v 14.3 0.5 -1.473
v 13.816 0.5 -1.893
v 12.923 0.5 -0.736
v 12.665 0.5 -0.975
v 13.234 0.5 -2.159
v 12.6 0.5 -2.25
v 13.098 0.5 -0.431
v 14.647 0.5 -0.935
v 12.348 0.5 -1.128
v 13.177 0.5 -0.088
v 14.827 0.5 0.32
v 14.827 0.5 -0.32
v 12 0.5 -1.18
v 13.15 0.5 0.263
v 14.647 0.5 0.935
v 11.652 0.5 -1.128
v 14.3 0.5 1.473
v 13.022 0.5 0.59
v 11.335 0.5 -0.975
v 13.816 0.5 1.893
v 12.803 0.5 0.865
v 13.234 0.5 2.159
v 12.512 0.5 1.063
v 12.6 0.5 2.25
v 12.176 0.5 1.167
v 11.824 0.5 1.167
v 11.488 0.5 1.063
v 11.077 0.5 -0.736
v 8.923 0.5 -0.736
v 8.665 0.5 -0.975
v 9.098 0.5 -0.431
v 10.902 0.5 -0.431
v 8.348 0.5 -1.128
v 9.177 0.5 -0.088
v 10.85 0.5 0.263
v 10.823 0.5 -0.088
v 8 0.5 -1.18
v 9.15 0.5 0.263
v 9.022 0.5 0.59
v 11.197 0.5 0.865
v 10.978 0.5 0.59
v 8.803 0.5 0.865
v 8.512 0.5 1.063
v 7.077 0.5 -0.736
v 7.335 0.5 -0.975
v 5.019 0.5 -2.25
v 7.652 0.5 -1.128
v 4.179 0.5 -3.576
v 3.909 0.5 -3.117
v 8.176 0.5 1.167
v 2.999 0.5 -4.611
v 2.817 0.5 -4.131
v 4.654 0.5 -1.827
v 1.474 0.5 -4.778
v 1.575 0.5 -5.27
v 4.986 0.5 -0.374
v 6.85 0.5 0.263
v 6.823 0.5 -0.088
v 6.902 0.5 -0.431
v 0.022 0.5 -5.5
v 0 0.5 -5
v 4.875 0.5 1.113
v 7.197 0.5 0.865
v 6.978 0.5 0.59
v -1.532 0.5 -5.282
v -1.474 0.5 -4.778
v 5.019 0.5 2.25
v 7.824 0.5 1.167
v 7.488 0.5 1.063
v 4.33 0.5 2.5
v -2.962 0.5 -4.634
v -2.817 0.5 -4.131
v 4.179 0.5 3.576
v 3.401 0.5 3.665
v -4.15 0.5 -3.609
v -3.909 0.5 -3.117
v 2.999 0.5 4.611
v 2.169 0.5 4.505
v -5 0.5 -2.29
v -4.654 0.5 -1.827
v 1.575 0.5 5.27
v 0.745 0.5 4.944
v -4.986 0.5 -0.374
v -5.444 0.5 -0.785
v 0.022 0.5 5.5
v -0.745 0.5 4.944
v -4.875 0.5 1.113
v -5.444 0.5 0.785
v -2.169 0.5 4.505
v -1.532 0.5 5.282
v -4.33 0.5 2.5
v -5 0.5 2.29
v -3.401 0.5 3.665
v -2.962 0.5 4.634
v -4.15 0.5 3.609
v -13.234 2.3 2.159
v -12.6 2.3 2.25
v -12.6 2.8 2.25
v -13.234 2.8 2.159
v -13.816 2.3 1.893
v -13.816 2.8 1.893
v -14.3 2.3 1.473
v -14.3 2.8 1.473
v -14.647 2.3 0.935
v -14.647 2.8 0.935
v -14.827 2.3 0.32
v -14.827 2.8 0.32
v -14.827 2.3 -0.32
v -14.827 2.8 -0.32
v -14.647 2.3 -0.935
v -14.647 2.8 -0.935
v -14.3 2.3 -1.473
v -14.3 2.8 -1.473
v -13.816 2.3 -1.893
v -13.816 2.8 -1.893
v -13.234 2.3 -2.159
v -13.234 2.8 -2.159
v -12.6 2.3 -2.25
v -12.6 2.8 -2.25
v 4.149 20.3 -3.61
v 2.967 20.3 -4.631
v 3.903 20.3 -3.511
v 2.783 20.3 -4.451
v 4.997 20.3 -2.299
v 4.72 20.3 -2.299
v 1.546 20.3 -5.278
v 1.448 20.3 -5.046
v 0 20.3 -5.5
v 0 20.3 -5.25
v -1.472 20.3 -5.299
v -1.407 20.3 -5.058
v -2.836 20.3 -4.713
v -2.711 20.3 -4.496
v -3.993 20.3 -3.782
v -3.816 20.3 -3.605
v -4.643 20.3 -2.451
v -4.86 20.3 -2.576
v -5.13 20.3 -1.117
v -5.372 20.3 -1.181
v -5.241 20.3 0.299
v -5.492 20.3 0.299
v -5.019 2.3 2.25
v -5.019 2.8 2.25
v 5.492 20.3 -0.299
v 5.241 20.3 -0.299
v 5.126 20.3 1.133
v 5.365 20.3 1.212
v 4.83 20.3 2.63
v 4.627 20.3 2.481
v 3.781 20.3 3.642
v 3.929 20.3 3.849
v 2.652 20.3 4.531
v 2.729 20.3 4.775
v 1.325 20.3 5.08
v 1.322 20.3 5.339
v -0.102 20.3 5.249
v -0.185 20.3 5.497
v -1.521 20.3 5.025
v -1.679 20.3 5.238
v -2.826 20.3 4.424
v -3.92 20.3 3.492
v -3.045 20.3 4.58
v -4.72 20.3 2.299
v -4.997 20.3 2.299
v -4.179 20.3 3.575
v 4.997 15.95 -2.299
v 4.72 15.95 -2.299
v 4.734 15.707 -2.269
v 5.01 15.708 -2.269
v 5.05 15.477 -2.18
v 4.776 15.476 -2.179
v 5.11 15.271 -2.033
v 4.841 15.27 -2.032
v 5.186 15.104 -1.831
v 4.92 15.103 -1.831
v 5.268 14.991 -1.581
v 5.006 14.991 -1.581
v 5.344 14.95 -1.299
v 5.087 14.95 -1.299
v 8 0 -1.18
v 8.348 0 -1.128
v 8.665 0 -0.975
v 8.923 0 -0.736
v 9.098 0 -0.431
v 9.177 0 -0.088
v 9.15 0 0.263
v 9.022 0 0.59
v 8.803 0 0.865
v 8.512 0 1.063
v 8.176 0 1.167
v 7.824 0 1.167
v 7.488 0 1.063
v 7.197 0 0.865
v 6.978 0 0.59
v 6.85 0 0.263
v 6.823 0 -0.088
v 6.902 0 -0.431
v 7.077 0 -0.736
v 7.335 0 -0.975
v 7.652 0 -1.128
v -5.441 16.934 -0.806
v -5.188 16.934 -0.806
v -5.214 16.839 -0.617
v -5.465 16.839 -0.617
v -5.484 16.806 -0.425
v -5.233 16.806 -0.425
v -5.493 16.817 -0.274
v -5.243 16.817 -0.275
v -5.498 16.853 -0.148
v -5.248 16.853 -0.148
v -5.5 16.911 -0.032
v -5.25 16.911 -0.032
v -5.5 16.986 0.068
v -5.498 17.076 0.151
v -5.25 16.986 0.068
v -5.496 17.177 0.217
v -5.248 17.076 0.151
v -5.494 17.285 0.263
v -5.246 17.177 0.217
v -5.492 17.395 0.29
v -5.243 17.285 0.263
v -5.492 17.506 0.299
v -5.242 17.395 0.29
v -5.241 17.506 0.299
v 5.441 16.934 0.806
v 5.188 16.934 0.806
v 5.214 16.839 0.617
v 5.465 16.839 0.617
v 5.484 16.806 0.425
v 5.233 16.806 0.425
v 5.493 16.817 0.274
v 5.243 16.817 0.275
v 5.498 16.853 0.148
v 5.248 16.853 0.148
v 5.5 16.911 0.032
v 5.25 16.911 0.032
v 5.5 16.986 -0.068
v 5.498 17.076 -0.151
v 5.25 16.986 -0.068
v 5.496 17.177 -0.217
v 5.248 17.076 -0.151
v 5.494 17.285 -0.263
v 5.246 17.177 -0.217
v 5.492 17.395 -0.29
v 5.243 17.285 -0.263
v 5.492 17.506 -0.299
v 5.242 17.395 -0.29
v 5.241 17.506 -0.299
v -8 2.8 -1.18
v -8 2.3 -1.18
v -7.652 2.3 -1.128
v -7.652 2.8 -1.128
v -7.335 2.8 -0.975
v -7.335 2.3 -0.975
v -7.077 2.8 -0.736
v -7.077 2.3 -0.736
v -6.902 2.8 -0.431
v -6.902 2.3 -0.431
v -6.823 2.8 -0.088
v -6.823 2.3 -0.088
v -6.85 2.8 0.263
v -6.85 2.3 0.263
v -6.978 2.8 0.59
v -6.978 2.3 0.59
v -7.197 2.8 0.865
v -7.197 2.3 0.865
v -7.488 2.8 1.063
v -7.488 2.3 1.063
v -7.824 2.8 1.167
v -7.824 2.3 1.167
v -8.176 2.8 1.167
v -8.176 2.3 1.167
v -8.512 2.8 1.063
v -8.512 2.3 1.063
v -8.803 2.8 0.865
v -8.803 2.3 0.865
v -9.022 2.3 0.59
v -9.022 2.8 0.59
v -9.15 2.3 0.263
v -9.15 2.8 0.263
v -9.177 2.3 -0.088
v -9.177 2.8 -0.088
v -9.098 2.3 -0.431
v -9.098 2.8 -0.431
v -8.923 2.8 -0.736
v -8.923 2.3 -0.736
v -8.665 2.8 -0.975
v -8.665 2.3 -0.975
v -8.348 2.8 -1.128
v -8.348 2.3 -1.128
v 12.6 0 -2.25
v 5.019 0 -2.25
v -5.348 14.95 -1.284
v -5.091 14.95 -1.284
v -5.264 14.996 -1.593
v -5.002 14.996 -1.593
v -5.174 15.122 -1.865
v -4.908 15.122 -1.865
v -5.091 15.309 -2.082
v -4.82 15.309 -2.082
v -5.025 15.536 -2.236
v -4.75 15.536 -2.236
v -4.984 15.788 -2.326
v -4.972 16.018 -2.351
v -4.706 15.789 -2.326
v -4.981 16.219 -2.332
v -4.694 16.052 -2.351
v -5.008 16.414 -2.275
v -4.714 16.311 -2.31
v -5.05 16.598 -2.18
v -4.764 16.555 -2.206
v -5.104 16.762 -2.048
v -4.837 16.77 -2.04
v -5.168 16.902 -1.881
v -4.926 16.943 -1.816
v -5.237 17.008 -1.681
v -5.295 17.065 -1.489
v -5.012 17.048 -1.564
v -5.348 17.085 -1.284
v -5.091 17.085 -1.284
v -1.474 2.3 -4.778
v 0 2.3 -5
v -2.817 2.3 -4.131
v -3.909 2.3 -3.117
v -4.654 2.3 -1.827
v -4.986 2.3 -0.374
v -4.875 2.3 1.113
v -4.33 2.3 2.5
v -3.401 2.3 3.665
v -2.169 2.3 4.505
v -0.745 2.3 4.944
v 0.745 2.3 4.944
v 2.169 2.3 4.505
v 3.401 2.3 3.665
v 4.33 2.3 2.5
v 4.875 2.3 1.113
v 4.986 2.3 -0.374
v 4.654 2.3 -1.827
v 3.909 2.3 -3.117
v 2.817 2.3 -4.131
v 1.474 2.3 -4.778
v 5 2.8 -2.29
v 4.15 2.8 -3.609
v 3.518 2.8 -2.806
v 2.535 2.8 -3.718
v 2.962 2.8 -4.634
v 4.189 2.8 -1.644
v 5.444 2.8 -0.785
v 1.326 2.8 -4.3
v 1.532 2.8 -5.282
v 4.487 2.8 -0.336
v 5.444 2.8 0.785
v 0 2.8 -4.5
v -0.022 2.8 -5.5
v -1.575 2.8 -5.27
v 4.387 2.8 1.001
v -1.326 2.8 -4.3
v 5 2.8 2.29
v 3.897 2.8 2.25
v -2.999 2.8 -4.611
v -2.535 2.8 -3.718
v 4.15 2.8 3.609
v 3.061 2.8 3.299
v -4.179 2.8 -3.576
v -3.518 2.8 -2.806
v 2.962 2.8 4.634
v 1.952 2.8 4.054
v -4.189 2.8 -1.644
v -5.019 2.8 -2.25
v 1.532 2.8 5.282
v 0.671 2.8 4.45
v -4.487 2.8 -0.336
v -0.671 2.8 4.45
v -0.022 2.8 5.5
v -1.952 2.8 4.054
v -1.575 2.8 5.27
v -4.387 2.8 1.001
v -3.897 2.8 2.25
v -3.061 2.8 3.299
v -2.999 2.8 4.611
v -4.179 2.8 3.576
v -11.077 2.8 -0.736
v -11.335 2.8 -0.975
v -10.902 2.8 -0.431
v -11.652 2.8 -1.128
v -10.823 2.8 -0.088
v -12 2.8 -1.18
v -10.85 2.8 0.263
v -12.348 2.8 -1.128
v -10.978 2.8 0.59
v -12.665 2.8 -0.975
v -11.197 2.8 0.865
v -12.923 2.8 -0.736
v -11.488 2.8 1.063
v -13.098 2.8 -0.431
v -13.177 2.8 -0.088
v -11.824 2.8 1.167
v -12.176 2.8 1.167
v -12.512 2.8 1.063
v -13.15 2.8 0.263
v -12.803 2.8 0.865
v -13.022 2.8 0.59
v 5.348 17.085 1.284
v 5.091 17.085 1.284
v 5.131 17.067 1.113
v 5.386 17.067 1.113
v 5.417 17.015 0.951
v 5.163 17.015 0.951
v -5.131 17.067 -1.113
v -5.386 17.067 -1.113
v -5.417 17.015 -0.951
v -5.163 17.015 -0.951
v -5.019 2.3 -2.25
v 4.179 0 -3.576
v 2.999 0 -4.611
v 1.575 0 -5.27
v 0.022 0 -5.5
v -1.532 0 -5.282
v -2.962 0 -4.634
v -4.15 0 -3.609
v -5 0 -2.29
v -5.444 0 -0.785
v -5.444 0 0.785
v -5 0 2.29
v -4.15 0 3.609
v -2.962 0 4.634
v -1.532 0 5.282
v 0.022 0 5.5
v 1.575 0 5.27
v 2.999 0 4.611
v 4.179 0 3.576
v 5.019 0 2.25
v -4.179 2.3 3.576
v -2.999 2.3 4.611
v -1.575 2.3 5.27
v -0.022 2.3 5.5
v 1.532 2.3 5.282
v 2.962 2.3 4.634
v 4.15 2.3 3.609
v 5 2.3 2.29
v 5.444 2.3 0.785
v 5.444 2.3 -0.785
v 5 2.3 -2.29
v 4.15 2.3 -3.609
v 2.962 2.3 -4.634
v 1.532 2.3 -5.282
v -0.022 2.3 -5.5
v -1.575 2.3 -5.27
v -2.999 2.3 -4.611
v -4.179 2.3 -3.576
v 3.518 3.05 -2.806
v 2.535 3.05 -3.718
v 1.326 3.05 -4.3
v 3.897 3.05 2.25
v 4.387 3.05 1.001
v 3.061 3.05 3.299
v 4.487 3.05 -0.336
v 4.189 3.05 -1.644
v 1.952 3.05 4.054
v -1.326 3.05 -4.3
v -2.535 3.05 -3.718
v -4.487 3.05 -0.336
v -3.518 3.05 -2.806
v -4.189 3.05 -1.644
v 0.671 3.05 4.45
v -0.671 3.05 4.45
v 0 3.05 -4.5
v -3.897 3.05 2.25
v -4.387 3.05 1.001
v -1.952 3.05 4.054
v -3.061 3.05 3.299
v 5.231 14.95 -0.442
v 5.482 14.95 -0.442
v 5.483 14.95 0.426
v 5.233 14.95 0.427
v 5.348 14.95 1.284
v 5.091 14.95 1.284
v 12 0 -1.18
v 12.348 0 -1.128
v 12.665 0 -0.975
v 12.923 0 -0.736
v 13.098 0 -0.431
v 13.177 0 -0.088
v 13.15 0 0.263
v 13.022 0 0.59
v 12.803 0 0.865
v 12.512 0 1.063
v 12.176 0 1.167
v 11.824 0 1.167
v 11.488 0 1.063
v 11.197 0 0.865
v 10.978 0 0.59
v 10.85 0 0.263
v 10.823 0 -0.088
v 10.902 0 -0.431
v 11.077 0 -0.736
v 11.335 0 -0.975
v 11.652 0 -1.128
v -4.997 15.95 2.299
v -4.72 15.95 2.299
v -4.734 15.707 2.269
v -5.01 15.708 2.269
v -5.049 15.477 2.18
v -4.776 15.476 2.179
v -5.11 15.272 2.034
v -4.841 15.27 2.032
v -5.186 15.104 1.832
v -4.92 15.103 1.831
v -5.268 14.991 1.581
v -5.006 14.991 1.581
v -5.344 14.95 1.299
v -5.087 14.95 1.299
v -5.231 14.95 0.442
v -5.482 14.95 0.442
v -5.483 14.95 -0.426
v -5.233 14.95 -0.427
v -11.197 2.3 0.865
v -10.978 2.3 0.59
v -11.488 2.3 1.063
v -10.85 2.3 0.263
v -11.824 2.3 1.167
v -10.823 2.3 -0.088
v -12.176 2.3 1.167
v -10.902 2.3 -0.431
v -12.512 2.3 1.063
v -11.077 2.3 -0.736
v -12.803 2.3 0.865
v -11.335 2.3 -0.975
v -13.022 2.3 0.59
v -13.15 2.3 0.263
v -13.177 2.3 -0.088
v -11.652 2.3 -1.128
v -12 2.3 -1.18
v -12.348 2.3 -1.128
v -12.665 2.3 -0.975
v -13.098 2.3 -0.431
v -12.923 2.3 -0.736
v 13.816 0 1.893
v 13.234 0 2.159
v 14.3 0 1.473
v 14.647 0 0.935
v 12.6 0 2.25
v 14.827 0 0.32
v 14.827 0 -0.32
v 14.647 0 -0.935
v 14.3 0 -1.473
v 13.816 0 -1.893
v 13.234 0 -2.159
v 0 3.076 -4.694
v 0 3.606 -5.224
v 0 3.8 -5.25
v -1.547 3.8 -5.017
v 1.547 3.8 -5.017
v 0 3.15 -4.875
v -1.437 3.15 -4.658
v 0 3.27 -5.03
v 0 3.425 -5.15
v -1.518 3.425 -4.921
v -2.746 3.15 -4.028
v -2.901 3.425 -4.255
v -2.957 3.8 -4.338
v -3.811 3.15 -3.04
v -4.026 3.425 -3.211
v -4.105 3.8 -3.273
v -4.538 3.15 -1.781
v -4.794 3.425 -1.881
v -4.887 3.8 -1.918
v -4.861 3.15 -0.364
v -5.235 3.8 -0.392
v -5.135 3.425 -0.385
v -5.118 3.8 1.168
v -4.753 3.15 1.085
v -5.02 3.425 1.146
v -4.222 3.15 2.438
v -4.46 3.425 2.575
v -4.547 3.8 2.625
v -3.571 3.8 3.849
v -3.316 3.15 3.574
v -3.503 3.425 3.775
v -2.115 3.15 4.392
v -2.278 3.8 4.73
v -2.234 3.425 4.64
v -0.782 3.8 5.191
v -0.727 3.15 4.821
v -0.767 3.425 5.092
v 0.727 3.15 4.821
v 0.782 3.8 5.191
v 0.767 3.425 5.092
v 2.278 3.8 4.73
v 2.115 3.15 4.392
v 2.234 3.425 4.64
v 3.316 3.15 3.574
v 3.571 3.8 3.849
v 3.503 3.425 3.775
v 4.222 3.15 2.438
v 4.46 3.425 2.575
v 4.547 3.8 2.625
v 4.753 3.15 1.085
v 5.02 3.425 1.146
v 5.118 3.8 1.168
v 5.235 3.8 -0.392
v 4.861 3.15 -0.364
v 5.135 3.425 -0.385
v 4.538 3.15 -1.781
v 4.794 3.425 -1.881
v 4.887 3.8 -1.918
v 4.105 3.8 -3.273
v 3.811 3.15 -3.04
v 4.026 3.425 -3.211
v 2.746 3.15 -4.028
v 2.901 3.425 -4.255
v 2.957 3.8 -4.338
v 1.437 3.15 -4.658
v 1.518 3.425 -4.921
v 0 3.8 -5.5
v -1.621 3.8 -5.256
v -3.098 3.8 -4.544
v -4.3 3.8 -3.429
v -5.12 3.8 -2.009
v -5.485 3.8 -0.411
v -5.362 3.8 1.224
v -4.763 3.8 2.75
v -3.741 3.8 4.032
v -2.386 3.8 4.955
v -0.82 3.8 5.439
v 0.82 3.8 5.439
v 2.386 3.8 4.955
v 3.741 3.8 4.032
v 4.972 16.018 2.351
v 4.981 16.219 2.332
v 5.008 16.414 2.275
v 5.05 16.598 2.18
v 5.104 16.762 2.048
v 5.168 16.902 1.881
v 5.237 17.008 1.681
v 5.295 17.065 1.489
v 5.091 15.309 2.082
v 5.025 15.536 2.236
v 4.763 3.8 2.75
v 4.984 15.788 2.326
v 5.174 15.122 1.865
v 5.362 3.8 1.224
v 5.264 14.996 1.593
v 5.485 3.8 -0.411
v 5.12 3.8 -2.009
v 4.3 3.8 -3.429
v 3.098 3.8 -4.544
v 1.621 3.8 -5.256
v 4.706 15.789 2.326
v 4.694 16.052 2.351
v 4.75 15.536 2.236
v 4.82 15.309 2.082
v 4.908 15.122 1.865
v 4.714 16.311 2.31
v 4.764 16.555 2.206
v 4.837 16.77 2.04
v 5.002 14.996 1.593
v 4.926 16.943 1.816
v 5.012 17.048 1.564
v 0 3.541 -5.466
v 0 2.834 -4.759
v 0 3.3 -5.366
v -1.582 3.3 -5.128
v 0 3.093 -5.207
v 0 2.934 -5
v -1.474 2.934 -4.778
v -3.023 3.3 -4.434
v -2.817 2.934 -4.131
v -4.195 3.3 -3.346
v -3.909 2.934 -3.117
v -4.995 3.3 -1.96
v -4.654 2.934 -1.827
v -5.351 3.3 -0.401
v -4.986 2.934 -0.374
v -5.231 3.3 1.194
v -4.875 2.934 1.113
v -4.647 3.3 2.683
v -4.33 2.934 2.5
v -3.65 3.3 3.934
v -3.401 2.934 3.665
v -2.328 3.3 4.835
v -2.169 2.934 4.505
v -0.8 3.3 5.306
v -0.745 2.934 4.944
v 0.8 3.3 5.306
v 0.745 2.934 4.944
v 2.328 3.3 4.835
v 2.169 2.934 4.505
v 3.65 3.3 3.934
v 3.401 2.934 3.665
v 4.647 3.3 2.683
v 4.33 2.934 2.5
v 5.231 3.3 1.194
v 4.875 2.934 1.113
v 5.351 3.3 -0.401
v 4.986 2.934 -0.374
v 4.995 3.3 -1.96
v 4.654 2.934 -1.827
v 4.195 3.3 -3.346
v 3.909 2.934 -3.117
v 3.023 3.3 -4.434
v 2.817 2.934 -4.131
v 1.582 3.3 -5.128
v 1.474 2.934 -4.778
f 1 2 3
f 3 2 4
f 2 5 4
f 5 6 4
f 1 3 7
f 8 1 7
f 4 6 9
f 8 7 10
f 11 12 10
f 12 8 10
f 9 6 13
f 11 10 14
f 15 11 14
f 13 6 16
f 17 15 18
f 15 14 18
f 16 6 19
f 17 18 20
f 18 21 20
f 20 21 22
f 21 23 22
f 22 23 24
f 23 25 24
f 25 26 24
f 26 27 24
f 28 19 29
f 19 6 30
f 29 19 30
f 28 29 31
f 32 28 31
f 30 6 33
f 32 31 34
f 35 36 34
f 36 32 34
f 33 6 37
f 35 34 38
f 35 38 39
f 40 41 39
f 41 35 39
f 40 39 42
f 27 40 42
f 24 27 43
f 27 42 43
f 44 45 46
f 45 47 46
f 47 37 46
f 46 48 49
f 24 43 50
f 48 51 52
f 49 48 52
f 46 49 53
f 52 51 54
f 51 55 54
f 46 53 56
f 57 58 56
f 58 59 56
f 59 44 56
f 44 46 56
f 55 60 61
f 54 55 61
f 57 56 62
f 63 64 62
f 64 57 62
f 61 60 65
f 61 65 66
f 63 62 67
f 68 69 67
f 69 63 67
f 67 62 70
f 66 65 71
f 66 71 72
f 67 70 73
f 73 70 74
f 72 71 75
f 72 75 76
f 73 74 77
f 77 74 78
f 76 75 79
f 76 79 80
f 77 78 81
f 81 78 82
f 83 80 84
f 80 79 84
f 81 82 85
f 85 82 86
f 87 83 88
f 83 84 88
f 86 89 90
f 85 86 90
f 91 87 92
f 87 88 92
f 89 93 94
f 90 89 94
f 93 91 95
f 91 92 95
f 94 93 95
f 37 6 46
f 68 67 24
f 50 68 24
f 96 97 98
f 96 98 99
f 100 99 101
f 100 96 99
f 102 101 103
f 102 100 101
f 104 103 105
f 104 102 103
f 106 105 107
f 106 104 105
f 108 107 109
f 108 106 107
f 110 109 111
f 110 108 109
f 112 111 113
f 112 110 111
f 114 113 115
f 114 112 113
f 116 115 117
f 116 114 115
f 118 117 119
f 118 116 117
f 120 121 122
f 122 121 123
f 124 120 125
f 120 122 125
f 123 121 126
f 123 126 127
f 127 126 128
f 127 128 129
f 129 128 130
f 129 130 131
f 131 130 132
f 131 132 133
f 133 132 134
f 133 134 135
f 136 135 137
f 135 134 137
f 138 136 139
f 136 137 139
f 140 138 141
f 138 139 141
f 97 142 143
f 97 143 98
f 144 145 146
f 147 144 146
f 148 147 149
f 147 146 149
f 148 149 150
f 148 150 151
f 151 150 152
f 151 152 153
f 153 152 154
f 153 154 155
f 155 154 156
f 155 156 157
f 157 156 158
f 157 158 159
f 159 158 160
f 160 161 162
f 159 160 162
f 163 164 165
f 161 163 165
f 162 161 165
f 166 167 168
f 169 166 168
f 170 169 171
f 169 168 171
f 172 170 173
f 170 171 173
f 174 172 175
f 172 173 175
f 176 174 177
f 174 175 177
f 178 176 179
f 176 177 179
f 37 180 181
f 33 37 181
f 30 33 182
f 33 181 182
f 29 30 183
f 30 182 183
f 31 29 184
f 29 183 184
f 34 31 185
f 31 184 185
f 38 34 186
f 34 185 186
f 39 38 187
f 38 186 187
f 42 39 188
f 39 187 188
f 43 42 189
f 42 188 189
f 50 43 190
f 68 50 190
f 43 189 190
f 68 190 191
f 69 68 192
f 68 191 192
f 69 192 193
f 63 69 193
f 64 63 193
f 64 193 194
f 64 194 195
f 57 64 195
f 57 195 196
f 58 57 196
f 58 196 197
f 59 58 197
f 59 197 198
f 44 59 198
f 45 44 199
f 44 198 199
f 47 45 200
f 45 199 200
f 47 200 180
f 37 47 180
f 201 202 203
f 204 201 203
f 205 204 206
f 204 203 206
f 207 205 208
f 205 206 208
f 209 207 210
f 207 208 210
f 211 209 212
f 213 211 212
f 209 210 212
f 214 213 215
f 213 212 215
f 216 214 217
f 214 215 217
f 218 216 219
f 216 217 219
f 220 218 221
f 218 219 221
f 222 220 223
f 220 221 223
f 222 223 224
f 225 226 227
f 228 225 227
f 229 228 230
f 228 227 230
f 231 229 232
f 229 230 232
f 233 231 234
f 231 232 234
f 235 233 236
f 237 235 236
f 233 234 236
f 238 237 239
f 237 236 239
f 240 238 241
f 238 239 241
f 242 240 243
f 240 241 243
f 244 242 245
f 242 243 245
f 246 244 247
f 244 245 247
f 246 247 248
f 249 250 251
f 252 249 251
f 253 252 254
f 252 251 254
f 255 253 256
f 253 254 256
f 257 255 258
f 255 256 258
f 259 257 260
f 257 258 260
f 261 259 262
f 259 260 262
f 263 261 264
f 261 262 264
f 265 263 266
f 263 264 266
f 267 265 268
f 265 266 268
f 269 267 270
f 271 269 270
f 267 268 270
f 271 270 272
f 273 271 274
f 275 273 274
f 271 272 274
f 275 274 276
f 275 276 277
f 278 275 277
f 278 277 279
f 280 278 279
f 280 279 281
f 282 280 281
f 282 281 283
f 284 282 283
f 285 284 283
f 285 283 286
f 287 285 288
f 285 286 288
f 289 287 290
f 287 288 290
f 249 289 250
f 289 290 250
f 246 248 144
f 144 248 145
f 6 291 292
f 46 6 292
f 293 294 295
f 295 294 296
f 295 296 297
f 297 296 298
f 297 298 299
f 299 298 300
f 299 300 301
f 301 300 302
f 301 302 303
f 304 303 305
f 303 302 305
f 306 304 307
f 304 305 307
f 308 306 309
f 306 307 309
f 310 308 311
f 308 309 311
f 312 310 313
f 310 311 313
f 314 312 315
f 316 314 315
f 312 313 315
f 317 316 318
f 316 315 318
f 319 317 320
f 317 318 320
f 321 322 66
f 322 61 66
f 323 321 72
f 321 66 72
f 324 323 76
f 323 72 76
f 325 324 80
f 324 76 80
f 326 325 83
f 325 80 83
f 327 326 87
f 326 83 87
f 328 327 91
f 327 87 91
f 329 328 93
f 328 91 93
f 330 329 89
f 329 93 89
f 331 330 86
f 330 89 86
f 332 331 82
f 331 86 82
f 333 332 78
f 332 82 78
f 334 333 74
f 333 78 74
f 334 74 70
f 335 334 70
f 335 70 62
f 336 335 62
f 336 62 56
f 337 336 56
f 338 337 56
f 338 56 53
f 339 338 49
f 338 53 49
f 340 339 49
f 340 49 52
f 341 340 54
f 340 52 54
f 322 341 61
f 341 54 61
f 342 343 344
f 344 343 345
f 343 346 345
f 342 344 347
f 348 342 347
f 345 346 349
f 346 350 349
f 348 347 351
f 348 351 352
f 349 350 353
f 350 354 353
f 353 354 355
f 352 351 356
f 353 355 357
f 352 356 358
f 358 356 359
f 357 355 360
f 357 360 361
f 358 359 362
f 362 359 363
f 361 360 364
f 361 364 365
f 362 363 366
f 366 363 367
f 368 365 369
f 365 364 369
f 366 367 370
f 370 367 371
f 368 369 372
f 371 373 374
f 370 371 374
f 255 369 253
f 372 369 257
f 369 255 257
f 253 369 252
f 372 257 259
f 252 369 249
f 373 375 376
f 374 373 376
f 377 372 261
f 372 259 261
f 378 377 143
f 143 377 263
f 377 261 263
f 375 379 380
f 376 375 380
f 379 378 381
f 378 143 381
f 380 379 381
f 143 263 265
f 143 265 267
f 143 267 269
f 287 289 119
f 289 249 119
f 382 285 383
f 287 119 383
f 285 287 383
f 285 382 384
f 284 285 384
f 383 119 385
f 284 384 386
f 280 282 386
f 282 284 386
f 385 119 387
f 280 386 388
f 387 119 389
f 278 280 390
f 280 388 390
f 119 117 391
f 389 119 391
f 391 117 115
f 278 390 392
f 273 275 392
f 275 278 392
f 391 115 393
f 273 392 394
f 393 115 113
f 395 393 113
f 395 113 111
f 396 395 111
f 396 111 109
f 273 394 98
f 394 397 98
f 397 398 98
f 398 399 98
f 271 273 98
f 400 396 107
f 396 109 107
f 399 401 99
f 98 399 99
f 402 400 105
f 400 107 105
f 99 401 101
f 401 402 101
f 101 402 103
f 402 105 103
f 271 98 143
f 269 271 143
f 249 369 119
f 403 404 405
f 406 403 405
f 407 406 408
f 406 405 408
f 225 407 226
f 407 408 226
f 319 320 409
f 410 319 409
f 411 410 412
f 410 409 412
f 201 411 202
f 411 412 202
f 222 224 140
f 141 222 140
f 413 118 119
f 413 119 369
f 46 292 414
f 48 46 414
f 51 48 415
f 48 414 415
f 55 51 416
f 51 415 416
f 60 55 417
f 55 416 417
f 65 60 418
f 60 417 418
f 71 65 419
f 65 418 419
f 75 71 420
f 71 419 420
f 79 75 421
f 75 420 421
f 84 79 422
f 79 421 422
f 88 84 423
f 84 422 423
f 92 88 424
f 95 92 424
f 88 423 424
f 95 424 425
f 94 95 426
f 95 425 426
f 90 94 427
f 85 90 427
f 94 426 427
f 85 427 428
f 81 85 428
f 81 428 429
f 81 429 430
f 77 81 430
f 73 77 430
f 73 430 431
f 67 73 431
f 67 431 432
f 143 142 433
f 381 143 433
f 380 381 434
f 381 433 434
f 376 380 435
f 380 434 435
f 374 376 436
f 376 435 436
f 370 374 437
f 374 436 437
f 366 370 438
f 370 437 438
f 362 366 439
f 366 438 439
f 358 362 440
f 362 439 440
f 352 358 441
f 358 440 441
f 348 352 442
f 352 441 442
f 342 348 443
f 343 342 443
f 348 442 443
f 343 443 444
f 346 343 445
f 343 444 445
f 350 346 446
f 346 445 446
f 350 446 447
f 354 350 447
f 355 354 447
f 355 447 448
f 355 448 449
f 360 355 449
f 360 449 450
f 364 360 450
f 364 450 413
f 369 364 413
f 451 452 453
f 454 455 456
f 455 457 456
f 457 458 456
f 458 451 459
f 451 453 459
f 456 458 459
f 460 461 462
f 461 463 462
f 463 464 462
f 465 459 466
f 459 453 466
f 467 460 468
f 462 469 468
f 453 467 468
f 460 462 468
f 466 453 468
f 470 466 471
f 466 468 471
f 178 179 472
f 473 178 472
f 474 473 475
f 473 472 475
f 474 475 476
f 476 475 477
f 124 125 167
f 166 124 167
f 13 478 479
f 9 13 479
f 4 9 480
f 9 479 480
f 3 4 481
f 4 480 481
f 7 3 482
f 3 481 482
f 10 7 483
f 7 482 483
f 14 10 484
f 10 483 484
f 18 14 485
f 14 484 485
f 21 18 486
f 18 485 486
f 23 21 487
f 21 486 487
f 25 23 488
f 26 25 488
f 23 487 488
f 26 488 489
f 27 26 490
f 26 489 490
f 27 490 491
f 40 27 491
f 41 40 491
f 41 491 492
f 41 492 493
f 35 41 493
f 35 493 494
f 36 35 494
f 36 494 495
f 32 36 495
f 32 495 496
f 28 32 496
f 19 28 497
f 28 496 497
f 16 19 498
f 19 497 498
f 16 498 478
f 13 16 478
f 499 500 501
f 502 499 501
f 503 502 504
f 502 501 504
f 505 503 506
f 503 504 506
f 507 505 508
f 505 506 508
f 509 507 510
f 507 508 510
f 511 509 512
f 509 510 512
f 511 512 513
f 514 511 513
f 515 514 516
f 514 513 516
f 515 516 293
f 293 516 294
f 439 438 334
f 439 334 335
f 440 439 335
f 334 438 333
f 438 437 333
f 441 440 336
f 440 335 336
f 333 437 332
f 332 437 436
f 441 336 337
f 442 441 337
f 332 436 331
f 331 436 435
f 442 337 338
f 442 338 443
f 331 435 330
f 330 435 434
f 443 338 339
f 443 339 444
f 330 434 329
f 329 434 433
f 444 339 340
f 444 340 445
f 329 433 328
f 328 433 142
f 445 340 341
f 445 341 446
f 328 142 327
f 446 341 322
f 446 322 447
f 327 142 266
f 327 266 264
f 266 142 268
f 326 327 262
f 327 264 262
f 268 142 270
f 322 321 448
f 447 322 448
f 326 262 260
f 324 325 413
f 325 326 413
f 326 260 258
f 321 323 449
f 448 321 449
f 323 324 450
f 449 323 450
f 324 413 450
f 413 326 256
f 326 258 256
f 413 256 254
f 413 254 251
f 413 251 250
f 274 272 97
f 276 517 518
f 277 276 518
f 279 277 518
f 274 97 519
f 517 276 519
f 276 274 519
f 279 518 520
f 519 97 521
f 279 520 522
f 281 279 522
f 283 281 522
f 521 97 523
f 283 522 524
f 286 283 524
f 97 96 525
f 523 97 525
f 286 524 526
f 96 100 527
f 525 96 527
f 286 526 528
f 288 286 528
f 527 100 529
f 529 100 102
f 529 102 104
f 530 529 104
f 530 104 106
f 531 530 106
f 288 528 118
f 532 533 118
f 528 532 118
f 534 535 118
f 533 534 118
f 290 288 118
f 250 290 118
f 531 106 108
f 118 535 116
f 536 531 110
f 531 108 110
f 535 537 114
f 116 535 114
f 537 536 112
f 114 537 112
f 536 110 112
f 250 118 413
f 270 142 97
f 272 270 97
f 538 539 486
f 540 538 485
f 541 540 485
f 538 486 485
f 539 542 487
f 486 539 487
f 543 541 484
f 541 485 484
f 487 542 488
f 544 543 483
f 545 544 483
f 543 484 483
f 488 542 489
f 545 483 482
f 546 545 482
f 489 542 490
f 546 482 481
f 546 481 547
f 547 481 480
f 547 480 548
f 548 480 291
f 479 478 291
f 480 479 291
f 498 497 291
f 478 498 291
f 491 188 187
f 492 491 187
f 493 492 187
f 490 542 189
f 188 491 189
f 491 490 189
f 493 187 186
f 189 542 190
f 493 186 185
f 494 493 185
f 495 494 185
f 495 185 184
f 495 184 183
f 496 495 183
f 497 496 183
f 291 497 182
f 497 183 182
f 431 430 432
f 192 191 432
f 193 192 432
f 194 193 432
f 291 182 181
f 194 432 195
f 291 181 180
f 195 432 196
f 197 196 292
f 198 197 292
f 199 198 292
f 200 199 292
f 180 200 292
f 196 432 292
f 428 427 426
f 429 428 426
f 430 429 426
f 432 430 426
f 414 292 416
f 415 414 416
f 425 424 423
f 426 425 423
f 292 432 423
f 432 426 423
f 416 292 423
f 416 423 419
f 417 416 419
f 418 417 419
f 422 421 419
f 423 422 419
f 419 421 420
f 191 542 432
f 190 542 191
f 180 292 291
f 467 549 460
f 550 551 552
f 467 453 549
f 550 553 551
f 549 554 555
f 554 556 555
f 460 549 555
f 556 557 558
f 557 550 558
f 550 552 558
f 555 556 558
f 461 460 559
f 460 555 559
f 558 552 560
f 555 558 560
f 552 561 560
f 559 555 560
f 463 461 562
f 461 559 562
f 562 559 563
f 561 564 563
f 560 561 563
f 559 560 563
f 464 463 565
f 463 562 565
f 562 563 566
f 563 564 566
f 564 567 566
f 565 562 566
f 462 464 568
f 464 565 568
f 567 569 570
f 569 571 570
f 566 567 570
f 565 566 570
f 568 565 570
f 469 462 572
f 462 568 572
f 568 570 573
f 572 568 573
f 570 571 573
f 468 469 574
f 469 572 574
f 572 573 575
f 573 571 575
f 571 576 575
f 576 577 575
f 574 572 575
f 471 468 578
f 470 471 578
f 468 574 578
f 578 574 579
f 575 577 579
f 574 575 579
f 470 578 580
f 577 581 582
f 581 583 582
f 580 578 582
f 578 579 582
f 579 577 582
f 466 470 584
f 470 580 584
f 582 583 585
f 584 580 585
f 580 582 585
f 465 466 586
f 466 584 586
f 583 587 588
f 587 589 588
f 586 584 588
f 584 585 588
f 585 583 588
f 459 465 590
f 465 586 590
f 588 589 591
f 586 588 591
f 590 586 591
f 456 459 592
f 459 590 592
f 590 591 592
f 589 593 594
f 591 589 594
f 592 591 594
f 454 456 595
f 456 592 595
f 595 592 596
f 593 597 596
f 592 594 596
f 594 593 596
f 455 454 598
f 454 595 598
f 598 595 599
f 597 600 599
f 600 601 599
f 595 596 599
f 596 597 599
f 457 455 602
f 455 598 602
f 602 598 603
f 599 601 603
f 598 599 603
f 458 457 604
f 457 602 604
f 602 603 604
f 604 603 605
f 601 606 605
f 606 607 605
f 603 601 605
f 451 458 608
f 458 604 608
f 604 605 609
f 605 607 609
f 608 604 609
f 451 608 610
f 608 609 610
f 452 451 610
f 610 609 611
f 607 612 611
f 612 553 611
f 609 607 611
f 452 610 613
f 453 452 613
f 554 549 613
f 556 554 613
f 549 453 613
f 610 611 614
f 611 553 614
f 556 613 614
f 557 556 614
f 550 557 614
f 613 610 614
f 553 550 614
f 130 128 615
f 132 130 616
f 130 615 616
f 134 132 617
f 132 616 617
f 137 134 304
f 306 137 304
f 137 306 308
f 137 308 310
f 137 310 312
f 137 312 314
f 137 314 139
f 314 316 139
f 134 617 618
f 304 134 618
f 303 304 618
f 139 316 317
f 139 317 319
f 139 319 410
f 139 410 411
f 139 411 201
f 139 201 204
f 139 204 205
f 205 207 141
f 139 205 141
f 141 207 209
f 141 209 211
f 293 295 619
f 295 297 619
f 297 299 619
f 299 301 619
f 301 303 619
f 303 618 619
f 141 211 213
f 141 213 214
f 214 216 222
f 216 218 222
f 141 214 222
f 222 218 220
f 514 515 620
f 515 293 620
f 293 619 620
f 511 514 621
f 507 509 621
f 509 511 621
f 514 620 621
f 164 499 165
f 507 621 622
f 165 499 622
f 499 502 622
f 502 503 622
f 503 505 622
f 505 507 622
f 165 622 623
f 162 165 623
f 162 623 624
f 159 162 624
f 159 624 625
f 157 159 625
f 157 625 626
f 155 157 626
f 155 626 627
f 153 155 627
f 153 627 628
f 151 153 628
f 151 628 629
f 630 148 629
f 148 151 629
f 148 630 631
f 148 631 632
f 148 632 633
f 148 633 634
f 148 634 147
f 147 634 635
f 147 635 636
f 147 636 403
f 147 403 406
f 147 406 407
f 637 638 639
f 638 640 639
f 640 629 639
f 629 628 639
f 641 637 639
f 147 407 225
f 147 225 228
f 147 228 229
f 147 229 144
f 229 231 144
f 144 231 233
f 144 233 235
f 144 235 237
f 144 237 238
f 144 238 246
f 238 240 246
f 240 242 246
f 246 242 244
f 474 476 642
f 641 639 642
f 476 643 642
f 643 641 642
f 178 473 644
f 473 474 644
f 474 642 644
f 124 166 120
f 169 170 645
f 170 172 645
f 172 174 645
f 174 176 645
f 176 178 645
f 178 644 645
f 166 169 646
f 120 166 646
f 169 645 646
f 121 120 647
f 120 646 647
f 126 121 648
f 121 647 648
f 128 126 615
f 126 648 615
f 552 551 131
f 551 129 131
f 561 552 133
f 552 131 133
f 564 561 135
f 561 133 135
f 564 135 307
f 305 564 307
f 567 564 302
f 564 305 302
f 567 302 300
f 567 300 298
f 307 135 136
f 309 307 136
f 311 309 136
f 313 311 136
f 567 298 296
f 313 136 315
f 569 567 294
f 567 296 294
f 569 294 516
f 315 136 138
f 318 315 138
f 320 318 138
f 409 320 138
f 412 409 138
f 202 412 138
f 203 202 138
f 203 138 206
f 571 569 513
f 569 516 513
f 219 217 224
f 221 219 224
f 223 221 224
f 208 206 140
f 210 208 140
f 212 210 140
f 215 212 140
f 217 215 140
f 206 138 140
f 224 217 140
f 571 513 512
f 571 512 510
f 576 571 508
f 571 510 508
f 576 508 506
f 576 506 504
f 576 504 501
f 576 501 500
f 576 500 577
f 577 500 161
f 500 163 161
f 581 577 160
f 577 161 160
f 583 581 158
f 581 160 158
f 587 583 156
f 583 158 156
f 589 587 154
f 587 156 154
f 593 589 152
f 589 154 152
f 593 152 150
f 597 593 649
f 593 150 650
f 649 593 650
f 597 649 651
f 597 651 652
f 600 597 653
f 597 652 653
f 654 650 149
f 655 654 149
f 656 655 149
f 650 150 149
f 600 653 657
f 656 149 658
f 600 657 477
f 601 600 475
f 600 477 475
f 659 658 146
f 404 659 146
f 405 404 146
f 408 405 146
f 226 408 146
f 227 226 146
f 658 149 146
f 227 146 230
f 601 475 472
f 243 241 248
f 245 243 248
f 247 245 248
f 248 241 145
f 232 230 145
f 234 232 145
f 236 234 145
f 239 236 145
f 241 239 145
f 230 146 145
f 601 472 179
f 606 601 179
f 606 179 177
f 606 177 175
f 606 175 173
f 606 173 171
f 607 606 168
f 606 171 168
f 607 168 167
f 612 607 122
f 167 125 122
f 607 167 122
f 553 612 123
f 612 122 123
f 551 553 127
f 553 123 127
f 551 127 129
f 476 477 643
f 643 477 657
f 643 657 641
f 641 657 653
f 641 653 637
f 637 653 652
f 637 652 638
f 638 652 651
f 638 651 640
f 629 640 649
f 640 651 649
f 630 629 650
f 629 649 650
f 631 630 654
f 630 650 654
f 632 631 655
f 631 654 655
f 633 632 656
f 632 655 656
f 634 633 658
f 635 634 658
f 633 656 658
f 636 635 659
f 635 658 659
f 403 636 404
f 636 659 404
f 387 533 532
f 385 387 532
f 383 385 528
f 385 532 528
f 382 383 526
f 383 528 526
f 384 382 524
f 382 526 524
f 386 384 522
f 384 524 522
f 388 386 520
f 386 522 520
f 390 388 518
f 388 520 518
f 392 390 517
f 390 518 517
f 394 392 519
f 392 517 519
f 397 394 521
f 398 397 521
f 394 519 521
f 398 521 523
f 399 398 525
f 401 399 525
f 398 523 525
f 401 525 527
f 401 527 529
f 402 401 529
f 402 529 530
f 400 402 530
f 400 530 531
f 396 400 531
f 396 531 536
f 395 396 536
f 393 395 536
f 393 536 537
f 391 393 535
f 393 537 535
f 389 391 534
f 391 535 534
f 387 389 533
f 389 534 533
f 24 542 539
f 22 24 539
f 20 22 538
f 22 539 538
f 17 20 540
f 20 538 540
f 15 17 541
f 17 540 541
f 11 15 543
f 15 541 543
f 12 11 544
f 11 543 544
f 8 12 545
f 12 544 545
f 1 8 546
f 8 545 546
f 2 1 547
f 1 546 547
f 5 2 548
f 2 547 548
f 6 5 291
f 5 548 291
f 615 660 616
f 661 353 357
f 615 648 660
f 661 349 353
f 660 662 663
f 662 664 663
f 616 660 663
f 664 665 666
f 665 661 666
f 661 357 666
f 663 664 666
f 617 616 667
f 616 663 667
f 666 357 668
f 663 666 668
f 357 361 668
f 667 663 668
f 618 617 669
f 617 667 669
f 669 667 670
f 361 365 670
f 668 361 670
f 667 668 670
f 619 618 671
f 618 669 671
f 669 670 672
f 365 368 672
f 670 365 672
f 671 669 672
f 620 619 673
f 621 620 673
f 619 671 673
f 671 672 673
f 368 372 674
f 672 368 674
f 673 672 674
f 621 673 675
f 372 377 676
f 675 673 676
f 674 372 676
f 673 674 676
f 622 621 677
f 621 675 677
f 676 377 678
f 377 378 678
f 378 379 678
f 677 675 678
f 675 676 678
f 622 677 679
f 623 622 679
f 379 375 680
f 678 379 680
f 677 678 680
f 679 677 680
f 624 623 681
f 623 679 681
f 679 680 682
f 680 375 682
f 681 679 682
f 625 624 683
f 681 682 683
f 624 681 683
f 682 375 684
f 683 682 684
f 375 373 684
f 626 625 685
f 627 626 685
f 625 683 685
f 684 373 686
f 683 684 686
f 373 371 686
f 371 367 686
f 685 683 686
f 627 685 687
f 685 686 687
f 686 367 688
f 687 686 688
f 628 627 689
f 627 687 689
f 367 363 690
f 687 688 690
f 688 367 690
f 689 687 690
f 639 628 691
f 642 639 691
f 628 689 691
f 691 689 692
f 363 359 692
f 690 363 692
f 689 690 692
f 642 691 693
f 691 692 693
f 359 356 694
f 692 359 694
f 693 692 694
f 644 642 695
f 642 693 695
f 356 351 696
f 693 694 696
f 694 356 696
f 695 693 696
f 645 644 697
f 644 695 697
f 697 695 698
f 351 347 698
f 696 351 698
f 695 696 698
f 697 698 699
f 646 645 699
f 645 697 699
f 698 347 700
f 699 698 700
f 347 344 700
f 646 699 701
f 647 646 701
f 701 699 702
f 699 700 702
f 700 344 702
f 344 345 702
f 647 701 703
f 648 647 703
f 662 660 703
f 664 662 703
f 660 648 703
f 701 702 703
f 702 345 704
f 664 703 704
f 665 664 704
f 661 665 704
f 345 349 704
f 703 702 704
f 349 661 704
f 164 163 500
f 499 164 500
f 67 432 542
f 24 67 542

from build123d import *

# Parameters (mm, degrees)
SKETCH2_R           = 1.18
BOSS_EXTRUDE1_DEPTH = 0.5
SKETCH3_R           = 1.18
BOSS_EXTRUDE2_DEPTH = 0.5
CUT_EXTRUDE1_DEPTH  = 10
CIRPATTERN1_COUNT   = 2
CIRPATTERN1_ANGLE   = 180


with BuildPart() as part:
    # Sketch1 → Revolve1 (revolve)
    with BuildSketch(Plane.XY, mode=Mode.PRIVATE) as revolve1_sk:
        with BuildLine():
            Line((5.5, 20.3), (5.5, 3.8))
            ThreePointArc((5.5, 3.8), (5.207106781, 3.092893219), (4.5, 2.8))
            Line((4.5, 2.8), (5.5, 2.8))
            Line((5.5, 2.8), (5.5, 2.3))
            Line((5.5, 2.3), (5, 2.3))
            Line((5, 2.3), (5, 0.5))
            Line((5, 0.5), (5.5, 0.5))
            Line((5.5, 0.5), (5.5, 0))
            Line((5.5, 0), (0, 0))
            Line((0, 0), (0, 3.05))
            Line((0, 3.05), (4.5, 3.05))
            ThreePointArc((4.5, 3.05), (5.030330086, 3.269669914), (5.25, 3.8))
            Line((5.25, 3.8), (5.25, 20.3))
            Line((5.25, 20.3), (5.5, 20.3))
        make_face()
    revolve(revolve1_sk.sketch.rotate(Axis((0, -2.4, 0), (0, 1, 0)), 90), axis=Axis((0, -2.4, 0), (0, 1, 0)))

    # Sketch2 → Boss-Extrude1 (add)
    with BuildSketch(Plane.XZ):
        with BuildLine():
            Line((5.018714975, 2.25), (12.6, 2.25))
            ThreePointArc((12.6, 2.25), (14.85, 0), (12.6, -2.25))
            Line((12.6, -2.25), (5.018714975, -2.25))
            ThreePointArc((5.018714975, -2.25), (5.5, 0), (5.018714975, 2.25))
        make_face()
        with Locations(Location((12, 0, 0), (0, 0, 270))):
            Circle(SKETCH2_R, mode=Mode.SUBTRACT)
        with Locations(Location((8, 0, 0), (0, 0, 270))):
            Circle(SKETCH2_R, mode=Mode.SUBTRACT)
    extrude(amount=-BOSS_EXTRUDE1_DEPTH)

    # Sketch3 → Boss-Extrude2 (add)
    with BuildSketch(Plane.XZ.offset(-2.3)):
        with BuildLine():
            Line((-5.018714975, 2.25), (-12.6, 2.25))
            ThreePointArc((-12.6, 2.25), (-14.85, 0), (-12.6, -2.25))
            Line((-12.6, -2.25), (-5.018714975, -2.25))
            ThreePointArc((-5.018714975, -2.25), (-5.37833303, -1.150449399), (-5.5, 0))
            ThreePointArc((-5.5, 0), (-5.37833303, 1.150449399), (-5.018714975, 2.25))
        make_face()
        with Locations(Location((-12, 0, 0), (0, 0, 270))):
            Circle(SKETCH3_R, mode=Mode.SUBTRACT)
        with Locations(Location((-8, 0, 0), (0, 0, 270))):
            Circle(SKETCH3_R, mode=Mode.SUBTRACT)
    extrude(amount=-BOSS_EXTRUDE2_DEPTH)

    # Sketch4 → Cut-Extrude1 (cut)
    with BuildSketch(Plane(origin=(0, 0, 0), x_dir=(0, 0, -1), z_dir=(1, 0, 0))):
        with BuildLine():
            Line((2.298813226, 20.3), (2.298813226, 15.95))
            ThreePointArc((2.298813226, 15.95), (2.005920007, 15.242893219), (1.298813226, 14.95))
            Line((1.298813226, 14.95), (-1.283627995, 14.95))
            ThreePointArc((-1.283627995, 14.95), (-2.351186774, 16.017558779), (-1.283627995, 17.085117557))
            ThreePointArc((-1.283627995, 17.085117557), (-1.03323034, 17.046337207), (-0.806294362, 16.933629784))
            ThreePointArc((-0.806294362, 16.933629784), (-0.079626551, 16.883947504), (0.298813226, 17.506280029))
            Line((0.298813226, 17.506280029), (0.298813226, 20.3))
            Line((0.298813226, 20.3), (2.298813226, 20.3))
        make_face()
    cut_extrude1 = extrude(amount=CUT_EXTRUDE1_DEPTH, mode=Mode.SUBTRACT)

    # CirPattern1: Cut-Extrude1 ×2 about axis
    cirpattern1_axis = Axis((0, 20.3, 0), (0, -1, 0))
    for i in range(1, CIRPATTERN1_COUNT):
        add(cut_extrude1.rotate(cirpattern1_axis, i * CIRPATTERN1_ANGLE / (CIRPATTERN1_COUNT - 1)), mode=Mode.SUBTRACT)


solid = part.part
